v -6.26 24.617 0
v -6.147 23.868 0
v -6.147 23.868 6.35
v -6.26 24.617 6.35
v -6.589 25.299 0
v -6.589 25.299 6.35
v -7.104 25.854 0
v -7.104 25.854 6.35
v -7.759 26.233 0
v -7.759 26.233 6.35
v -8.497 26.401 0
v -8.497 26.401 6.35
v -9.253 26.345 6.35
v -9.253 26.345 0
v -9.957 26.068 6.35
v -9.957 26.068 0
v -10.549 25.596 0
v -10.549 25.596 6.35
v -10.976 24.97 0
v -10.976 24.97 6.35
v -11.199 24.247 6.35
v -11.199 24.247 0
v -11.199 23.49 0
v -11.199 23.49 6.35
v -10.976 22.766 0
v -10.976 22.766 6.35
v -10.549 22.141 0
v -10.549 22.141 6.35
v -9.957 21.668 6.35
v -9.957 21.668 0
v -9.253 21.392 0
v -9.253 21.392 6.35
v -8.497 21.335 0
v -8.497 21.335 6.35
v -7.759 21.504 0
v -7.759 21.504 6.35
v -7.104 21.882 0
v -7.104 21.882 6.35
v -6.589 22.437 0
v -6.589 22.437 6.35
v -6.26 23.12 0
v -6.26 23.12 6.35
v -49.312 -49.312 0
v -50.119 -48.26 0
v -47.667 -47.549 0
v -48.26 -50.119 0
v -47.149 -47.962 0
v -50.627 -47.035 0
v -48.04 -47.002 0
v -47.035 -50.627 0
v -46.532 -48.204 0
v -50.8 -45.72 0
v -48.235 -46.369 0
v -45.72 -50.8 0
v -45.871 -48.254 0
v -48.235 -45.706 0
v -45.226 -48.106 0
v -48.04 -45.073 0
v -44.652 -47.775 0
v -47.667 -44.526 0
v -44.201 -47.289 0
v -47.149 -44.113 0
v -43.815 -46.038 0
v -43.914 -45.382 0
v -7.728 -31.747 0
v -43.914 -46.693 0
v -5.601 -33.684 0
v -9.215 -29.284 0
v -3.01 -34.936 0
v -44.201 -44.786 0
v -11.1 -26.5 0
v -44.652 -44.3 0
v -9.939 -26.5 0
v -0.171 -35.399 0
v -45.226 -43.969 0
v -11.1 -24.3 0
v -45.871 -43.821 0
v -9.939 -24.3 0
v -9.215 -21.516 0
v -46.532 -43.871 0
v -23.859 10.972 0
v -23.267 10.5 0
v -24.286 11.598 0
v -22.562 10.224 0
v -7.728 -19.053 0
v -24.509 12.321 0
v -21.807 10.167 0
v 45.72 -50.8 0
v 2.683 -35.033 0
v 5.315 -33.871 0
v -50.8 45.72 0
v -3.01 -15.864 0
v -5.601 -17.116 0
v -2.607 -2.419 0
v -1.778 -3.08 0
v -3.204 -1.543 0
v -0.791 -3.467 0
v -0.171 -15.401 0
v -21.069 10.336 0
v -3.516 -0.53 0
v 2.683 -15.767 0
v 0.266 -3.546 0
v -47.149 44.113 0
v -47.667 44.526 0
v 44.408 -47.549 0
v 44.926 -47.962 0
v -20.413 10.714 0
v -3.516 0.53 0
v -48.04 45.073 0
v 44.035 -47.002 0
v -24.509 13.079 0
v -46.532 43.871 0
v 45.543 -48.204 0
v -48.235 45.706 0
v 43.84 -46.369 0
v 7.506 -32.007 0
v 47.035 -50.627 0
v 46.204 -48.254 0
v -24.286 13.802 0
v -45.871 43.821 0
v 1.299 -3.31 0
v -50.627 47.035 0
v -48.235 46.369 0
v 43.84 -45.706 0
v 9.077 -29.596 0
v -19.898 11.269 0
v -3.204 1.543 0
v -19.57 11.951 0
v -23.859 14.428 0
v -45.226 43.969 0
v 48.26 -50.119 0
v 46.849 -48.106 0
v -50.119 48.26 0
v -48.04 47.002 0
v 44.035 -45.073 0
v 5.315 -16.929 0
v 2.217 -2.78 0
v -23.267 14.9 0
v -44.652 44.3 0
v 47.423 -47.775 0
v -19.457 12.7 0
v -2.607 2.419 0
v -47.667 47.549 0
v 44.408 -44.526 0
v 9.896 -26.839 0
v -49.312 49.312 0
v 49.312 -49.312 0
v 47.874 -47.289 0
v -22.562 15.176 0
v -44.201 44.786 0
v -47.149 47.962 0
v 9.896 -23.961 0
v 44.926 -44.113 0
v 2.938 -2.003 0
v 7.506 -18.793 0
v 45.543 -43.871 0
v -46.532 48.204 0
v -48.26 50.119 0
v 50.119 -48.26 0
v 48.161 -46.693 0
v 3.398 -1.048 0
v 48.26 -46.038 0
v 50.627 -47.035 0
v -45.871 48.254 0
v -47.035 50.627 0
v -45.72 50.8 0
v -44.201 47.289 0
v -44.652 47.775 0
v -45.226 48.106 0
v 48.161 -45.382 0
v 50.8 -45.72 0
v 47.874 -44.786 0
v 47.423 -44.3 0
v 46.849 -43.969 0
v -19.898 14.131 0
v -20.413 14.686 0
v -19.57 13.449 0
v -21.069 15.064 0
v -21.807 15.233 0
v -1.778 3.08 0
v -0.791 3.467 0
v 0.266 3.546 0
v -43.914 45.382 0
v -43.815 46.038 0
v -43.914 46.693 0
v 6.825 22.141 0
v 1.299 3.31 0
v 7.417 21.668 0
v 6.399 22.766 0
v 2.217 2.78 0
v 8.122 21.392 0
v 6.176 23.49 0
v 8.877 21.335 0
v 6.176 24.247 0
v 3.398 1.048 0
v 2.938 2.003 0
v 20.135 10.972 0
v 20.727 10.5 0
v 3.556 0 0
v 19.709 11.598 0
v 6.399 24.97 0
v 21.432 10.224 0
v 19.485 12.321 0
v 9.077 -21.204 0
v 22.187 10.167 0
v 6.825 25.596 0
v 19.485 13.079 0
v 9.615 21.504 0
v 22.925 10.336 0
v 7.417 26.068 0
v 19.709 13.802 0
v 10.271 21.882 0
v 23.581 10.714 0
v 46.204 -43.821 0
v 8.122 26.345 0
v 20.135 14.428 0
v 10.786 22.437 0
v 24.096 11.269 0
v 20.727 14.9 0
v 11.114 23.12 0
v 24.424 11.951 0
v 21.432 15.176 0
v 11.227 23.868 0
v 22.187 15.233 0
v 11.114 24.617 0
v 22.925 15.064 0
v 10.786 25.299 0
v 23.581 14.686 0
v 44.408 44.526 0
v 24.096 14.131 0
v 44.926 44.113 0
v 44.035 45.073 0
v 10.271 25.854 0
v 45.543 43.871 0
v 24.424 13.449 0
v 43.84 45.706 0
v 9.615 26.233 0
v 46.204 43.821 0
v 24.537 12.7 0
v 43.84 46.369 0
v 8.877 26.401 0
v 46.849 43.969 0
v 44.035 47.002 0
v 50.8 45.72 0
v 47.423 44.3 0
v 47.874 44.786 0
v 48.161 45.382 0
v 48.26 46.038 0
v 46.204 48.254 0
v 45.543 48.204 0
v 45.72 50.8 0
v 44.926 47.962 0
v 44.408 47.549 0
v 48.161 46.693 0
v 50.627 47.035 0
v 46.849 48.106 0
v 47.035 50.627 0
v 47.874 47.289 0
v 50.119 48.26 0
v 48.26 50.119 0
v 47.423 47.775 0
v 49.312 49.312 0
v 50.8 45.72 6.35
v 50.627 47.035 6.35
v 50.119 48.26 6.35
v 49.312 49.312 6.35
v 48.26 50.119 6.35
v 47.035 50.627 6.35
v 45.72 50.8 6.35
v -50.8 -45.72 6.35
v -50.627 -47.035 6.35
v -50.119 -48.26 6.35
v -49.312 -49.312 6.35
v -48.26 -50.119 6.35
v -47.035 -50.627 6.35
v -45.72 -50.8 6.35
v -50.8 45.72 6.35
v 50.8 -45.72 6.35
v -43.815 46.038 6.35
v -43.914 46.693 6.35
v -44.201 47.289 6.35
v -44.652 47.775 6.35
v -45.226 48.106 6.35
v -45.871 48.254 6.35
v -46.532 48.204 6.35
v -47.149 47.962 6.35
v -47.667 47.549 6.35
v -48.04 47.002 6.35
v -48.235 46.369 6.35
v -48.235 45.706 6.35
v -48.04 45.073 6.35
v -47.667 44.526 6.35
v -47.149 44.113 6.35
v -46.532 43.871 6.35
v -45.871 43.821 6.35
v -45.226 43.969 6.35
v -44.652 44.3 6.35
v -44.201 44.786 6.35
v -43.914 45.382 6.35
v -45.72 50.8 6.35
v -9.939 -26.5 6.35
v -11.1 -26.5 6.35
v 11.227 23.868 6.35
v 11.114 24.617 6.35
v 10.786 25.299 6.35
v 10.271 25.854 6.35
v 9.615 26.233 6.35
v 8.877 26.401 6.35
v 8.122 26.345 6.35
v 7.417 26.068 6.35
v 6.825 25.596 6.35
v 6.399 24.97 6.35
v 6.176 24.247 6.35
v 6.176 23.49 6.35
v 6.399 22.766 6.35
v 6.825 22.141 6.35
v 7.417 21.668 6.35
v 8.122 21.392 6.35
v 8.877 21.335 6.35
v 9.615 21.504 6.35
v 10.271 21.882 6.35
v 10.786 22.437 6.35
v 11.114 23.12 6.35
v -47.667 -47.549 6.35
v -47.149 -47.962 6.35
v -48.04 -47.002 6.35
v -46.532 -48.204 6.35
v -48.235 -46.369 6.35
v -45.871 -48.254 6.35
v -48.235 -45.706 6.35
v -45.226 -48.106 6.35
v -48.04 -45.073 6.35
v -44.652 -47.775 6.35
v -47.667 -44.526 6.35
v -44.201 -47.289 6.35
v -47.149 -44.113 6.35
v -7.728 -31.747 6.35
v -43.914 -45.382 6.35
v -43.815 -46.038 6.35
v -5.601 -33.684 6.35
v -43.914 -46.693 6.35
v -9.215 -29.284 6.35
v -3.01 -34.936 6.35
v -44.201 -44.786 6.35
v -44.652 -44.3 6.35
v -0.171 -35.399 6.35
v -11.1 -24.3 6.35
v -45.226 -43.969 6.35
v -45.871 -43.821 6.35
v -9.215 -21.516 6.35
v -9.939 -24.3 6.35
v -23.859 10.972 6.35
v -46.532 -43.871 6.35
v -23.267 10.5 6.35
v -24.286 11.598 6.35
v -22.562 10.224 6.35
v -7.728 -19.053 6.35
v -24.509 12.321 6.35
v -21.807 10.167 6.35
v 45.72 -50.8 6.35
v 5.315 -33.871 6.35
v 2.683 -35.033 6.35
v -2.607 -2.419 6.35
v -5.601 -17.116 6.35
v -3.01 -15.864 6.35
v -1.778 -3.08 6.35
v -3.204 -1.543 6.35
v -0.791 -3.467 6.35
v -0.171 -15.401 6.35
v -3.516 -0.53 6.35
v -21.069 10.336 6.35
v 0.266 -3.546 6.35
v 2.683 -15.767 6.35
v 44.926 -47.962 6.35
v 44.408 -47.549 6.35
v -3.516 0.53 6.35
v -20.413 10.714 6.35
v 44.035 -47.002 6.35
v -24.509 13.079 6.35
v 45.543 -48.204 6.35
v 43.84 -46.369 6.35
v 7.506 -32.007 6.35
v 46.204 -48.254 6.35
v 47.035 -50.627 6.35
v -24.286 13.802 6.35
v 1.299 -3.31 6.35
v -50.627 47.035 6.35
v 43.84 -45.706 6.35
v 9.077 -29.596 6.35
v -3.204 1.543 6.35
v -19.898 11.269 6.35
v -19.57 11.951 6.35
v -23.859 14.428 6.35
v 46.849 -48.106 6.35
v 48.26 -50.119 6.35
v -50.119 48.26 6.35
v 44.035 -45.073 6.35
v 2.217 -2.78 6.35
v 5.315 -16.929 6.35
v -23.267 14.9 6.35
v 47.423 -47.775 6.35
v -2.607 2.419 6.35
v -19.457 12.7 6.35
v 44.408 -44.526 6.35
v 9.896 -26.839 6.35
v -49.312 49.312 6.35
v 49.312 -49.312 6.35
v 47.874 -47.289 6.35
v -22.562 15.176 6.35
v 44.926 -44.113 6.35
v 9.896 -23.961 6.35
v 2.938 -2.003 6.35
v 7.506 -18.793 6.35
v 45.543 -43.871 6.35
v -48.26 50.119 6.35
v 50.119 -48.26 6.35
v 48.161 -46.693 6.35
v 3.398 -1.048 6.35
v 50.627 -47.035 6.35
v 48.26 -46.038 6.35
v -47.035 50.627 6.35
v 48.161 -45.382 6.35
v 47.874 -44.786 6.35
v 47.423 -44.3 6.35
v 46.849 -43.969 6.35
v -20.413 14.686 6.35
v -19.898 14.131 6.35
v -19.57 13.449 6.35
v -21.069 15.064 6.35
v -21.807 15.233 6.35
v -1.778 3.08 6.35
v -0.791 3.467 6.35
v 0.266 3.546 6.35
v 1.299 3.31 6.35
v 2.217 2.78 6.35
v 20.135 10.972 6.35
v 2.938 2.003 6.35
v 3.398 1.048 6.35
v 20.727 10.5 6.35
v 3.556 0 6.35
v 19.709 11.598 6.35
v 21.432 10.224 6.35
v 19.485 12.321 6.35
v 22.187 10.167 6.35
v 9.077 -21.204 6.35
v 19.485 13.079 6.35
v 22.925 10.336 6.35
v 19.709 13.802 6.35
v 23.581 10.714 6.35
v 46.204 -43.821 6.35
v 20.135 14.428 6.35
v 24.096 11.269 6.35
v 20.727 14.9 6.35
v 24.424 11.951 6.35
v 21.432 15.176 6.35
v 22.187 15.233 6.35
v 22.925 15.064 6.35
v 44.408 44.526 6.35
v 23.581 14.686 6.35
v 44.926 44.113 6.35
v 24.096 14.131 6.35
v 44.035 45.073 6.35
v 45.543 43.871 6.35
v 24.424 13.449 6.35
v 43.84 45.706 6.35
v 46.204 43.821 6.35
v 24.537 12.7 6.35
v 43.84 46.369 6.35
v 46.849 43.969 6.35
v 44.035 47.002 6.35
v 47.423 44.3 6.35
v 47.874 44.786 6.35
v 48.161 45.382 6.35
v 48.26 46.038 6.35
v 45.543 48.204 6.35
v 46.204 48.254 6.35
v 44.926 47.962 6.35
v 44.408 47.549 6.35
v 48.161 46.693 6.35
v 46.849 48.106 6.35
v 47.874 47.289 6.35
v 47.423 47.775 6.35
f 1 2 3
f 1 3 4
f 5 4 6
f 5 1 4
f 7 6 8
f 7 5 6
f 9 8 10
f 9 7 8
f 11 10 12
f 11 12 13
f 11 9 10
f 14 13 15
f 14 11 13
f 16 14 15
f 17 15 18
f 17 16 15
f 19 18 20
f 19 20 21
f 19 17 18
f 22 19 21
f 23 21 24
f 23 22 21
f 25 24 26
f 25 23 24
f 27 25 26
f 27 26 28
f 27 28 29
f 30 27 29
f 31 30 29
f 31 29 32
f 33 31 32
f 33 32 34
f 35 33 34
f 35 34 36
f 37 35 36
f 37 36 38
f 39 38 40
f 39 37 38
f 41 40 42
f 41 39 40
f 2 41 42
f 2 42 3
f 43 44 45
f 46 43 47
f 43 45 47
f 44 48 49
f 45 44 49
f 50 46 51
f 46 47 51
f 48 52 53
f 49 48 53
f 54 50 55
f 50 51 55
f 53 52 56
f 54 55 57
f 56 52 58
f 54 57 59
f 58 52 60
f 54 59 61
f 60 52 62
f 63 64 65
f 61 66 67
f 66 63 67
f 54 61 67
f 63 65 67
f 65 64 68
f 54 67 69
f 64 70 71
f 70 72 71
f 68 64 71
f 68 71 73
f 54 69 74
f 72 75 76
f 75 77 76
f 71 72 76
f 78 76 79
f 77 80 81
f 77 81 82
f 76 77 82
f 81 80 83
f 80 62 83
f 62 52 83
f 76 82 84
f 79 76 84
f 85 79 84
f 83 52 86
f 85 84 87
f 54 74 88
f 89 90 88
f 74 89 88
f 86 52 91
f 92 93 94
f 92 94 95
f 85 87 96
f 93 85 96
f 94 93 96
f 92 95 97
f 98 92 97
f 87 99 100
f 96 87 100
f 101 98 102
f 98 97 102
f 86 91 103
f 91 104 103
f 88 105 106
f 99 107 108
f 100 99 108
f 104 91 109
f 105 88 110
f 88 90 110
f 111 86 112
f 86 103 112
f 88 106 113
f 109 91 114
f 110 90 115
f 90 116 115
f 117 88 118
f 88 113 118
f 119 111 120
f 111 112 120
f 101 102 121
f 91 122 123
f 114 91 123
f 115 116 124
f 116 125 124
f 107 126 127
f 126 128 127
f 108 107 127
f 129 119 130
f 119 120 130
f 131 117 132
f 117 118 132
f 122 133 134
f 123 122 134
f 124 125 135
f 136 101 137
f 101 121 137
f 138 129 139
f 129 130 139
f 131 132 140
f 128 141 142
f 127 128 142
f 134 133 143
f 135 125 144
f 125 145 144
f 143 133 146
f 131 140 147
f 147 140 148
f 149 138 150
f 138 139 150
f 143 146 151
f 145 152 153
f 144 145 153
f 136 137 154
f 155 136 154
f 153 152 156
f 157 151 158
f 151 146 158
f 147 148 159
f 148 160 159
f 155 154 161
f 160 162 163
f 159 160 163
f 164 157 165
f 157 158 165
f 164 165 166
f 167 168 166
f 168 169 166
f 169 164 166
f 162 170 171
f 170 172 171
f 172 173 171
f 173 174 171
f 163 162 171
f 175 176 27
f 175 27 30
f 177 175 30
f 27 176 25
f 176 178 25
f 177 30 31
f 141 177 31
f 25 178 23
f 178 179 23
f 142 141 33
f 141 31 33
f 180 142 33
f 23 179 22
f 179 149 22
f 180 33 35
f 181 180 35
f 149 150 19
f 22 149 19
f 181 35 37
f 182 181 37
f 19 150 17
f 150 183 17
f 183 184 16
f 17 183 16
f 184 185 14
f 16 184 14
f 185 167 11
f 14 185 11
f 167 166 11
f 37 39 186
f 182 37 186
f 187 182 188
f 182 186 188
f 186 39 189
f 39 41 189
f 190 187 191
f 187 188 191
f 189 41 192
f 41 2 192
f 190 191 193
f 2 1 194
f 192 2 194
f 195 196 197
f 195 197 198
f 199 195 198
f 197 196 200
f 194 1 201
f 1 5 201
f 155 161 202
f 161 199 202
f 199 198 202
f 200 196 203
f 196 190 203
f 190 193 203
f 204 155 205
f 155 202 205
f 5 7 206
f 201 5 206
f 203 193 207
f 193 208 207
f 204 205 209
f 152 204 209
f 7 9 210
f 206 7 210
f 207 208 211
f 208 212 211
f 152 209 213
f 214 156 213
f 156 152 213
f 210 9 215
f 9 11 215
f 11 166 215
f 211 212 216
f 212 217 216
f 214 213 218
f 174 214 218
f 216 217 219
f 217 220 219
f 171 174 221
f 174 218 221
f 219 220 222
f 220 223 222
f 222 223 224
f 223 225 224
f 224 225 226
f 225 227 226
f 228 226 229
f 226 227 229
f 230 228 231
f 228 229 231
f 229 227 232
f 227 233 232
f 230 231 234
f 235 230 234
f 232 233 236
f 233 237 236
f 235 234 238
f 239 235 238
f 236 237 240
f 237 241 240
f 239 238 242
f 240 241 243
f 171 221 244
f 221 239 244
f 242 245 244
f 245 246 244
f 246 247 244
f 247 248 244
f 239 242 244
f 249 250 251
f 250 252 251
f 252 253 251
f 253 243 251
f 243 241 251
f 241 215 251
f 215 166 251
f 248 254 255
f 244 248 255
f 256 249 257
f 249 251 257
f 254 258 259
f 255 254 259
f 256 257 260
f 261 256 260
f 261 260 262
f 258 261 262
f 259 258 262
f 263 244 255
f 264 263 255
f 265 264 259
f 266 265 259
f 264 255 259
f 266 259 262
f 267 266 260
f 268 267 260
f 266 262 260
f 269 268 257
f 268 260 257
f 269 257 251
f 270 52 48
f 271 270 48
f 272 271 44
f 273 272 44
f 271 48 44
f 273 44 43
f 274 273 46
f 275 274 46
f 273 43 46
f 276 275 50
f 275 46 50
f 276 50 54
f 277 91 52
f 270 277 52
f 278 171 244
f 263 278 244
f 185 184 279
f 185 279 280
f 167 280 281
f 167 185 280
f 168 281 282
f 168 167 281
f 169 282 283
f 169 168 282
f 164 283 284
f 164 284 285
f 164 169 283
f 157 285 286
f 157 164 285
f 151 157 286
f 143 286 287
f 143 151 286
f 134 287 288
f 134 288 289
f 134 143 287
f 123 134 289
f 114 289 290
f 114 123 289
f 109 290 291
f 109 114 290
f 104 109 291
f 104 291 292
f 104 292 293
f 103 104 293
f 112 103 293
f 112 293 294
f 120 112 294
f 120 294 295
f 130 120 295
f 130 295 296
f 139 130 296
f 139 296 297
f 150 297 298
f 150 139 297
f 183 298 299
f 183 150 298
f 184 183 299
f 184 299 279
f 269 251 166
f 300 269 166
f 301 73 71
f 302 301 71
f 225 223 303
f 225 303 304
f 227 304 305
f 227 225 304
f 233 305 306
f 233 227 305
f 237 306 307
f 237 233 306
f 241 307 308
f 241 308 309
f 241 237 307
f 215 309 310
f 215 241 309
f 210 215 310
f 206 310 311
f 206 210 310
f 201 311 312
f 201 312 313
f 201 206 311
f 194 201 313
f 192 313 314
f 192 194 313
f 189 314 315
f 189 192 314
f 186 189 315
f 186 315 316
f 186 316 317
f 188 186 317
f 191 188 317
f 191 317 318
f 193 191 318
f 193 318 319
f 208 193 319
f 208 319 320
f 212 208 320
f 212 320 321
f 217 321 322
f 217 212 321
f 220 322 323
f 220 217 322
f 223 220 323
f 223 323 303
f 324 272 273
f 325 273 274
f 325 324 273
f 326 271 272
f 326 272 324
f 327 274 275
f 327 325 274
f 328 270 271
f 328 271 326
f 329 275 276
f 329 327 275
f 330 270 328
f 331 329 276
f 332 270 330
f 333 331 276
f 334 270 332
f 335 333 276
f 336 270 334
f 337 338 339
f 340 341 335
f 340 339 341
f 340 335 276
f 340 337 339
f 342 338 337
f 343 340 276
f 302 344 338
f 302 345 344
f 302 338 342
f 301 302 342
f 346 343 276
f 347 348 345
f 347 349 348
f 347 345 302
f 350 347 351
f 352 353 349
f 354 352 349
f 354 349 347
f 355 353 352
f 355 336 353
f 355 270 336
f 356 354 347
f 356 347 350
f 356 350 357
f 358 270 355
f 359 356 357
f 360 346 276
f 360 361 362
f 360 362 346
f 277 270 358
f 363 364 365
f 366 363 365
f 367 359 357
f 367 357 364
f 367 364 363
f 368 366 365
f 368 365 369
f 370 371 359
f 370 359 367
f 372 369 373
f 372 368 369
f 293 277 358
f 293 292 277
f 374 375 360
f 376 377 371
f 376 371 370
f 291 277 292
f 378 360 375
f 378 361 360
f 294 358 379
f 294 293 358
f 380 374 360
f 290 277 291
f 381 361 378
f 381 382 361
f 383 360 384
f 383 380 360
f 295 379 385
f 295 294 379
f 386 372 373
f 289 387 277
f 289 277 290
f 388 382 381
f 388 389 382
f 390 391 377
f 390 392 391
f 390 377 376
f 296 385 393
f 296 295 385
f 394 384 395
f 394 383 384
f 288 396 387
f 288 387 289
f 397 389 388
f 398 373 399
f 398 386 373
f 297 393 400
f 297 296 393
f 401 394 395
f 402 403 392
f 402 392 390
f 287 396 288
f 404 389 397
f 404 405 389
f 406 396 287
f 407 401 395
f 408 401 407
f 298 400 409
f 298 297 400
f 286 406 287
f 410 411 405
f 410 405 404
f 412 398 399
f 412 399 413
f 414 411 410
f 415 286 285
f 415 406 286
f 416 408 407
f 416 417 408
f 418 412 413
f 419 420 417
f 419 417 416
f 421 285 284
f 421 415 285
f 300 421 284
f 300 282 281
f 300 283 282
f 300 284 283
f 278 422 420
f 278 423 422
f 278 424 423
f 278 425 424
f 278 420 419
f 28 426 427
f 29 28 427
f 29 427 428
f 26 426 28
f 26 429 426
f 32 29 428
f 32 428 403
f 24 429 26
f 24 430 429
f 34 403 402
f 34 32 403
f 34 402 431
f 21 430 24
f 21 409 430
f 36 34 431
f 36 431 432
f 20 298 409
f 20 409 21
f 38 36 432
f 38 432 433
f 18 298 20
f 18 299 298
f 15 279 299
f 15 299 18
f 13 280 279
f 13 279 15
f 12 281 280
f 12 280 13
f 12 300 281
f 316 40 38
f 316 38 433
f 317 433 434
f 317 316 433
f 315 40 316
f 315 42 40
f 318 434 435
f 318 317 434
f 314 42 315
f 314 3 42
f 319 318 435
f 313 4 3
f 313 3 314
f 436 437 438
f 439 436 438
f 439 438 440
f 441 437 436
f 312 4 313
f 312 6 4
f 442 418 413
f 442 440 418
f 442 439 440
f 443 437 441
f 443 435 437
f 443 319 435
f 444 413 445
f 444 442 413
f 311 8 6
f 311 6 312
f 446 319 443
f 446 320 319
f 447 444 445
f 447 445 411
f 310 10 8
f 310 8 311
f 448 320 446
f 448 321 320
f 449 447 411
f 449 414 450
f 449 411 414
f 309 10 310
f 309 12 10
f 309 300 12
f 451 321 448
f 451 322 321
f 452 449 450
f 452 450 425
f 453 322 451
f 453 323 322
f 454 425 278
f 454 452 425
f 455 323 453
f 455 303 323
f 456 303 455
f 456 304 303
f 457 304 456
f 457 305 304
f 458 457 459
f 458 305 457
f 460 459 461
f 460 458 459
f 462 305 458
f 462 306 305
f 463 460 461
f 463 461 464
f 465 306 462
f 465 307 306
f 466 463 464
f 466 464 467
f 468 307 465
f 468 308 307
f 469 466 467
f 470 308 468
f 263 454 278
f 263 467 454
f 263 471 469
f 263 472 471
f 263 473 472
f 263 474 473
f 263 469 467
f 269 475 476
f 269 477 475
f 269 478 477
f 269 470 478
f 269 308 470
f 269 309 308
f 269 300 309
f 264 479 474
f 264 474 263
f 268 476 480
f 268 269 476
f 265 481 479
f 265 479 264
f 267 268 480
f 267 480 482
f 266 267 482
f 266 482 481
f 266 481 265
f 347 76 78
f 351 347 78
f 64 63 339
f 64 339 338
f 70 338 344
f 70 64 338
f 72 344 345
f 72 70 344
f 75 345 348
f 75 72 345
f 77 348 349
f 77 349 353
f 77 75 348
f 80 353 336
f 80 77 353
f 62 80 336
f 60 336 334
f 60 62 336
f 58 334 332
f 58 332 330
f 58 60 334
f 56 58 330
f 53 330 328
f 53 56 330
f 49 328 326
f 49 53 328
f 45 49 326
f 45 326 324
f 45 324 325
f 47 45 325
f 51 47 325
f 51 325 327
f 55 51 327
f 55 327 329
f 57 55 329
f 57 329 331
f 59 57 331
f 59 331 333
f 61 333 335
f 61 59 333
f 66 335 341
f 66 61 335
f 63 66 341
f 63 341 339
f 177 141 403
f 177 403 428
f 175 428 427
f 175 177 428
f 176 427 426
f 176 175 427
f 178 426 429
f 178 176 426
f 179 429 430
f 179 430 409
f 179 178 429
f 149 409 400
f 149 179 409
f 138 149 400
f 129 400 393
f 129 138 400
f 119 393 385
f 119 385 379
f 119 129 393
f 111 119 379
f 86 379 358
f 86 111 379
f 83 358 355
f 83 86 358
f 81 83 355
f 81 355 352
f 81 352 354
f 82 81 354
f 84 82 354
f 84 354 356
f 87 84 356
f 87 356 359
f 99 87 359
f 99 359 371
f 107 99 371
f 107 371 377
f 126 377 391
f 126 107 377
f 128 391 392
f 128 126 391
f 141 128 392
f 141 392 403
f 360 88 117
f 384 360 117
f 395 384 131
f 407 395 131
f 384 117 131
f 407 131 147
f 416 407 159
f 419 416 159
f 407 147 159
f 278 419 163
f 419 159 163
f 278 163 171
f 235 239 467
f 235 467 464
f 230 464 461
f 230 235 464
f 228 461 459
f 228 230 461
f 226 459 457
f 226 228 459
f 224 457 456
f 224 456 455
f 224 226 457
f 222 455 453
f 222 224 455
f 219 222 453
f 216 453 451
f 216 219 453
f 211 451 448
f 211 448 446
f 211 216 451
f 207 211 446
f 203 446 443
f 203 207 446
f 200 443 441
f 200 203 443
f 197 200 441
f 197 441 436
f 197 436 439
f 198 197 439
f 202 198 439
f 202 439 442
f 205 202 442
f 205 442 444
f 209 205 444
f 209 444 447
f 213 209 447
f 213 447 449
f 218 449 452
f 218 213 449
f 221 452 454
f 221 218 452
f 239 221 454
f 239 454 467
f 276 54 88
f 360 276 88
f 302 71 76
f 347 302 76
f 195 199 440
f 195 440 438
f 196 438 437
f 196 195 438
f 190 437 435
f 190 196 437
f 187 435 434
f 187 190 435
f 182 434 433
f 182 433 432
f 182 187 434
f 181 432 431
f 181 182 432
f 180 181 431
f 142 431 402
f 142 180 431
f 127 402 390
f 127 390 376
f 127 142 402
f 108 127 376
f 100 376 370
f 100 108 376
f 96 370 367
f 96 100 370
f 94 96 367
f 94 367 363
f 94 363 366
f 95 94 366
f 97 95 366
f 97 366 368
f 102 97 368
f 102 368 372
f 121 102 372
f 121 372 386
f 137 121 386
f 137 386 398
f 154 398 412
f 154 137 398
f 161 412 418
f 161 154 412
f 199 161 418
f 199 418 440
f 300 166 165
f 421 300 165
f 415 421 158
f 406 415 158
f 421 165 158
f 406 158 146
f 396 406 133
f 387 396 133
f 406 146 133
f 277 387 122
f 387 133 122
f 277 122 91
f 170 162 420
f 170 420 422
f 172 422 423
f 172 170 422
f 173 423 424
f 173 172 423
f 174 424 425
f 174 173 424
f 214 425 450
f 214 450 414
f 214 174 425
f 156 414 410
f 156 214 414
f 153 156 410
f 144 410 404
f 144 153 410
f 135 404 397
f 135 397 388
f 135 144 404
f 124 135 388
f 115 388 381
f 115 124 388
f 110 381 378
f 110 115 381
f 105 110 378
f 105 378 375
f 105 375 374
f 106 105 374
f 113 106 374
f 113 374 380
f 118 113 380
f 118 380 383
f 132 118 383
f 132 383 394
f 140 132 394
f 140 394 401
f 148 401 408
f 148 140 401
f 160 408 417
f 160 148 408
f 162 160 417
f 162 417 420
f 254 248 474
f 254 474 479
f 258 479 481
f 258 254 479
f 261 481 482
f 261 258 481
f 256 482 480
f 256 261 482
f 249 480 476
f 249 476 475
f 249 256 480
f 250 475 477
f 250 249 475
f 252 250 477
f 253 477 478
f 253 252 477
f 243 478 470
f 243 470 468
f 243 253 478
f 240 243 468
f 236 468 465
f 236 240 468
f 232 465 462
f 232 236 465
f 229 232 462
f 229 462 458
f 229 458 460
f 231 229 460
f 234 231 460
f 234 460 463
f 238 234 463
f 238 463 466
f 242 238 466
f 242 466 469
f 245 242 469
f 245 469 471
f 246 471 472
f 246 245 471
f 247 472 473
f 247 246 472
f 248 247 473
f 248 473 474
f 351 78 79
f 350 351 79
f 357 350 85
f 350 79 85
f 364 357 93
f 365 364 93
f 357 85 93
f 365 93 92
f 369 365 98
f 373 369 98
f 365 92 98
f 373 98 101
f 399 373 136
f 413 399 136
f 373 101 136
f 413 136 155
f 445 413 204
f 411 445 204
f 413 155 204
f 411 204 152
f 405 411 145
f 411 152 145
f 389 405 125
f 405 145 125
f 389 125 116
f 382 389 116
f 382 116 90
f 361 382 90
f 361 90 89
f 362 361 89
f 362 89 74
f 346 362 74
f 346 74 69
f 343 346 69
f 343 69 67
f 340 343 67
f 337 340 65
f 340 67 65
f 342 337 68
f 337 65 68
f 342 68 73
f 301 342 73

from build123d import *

# Parameters (mm, degrees)
F0_R     = 2.2225
F0_R_2   = 3.556
F0_R_3   = 2.54
F1_DEPTH = 6.35


with BuildPart() as f1:
    # F0 (on Top) → F1 (new body)
    with BuildSketch(Plane.XY):
        with BuildLine():
            Line((45.72, 50.8), (-45.72, 50.8))
            ThreePointArc((-45.72, 50.8), (-49.312102, 49.312102), (-50.8, 45.72))
            Line((-50.8, 45.72), (-50.8, -45.72))
            ThreePointArc((-50.8, -45.72), (-49.312102, -49.312102), (-45.72, -50.8))
            Line((-45.72, -50.8), (45.72, -50.8))
            ThreePointArc((45.72, -50.8), (49.312102, -49.312102), (50.8, -45.72))
            Line((50.8, -45.72), (50.8, 45.72))
            ThreePointArc((50.8, 45.72), (49.312102, 49.312102), (45.72, 50.8))
        make_face()
        with Locations((-46.0375, -46.0375)):
            Circle(F0_R, mode=Mode.SUBTRACT)
        with BuildLine():
            ThreePointArc((-9.939316, -24.3), (10, -25.4), (-9.939316, -26.5))
            Line((-9.939316, -26.5), (-11.1, -26.5))
            Line((-11.1, -26.5), (-11.1, -25.4))
            Line((-11.1, -25.4), (-11.1, -24.3))
            Line((-11.1, -24.3), (-9.939316, -24.3))
        make_face(mode=Mode.SUBTRACT)
        Circle(F0_R_2, mode=Mode.SUBTRACT)
        with Locations((46.0375, -46.0375)):
            Circle(F0_R, mode=Mode.SUBTRACT)
        with Locations((-21.997045, 12.7)):
            Circle(F0_R_3, mode=Mode.SUBTRACT)
        with Locations((-8.687312, 23.868193)):
            Circle(F0_R_3, mode=Mode.SUBTRACT)
        with Locations((-46.0375, 46.0375)):
            Circle(F0_R, mode=Mode.SUBTRACT)
        with Locations((8.687312, 23.868193)):
            Circle(F0_R_3, mode=Mode.SUBTRACT)
        with Locations((21.997045, 12.7)):
            Circle(F0_R_3, mode=Mode.SUBTRACT)
        with Locations((46.0375, 46.0375)):
            Circle(F0_R, mode=Mode.SUBTRACT)
    extrude(amount=F1_DEPTH)


solid = f1.part
